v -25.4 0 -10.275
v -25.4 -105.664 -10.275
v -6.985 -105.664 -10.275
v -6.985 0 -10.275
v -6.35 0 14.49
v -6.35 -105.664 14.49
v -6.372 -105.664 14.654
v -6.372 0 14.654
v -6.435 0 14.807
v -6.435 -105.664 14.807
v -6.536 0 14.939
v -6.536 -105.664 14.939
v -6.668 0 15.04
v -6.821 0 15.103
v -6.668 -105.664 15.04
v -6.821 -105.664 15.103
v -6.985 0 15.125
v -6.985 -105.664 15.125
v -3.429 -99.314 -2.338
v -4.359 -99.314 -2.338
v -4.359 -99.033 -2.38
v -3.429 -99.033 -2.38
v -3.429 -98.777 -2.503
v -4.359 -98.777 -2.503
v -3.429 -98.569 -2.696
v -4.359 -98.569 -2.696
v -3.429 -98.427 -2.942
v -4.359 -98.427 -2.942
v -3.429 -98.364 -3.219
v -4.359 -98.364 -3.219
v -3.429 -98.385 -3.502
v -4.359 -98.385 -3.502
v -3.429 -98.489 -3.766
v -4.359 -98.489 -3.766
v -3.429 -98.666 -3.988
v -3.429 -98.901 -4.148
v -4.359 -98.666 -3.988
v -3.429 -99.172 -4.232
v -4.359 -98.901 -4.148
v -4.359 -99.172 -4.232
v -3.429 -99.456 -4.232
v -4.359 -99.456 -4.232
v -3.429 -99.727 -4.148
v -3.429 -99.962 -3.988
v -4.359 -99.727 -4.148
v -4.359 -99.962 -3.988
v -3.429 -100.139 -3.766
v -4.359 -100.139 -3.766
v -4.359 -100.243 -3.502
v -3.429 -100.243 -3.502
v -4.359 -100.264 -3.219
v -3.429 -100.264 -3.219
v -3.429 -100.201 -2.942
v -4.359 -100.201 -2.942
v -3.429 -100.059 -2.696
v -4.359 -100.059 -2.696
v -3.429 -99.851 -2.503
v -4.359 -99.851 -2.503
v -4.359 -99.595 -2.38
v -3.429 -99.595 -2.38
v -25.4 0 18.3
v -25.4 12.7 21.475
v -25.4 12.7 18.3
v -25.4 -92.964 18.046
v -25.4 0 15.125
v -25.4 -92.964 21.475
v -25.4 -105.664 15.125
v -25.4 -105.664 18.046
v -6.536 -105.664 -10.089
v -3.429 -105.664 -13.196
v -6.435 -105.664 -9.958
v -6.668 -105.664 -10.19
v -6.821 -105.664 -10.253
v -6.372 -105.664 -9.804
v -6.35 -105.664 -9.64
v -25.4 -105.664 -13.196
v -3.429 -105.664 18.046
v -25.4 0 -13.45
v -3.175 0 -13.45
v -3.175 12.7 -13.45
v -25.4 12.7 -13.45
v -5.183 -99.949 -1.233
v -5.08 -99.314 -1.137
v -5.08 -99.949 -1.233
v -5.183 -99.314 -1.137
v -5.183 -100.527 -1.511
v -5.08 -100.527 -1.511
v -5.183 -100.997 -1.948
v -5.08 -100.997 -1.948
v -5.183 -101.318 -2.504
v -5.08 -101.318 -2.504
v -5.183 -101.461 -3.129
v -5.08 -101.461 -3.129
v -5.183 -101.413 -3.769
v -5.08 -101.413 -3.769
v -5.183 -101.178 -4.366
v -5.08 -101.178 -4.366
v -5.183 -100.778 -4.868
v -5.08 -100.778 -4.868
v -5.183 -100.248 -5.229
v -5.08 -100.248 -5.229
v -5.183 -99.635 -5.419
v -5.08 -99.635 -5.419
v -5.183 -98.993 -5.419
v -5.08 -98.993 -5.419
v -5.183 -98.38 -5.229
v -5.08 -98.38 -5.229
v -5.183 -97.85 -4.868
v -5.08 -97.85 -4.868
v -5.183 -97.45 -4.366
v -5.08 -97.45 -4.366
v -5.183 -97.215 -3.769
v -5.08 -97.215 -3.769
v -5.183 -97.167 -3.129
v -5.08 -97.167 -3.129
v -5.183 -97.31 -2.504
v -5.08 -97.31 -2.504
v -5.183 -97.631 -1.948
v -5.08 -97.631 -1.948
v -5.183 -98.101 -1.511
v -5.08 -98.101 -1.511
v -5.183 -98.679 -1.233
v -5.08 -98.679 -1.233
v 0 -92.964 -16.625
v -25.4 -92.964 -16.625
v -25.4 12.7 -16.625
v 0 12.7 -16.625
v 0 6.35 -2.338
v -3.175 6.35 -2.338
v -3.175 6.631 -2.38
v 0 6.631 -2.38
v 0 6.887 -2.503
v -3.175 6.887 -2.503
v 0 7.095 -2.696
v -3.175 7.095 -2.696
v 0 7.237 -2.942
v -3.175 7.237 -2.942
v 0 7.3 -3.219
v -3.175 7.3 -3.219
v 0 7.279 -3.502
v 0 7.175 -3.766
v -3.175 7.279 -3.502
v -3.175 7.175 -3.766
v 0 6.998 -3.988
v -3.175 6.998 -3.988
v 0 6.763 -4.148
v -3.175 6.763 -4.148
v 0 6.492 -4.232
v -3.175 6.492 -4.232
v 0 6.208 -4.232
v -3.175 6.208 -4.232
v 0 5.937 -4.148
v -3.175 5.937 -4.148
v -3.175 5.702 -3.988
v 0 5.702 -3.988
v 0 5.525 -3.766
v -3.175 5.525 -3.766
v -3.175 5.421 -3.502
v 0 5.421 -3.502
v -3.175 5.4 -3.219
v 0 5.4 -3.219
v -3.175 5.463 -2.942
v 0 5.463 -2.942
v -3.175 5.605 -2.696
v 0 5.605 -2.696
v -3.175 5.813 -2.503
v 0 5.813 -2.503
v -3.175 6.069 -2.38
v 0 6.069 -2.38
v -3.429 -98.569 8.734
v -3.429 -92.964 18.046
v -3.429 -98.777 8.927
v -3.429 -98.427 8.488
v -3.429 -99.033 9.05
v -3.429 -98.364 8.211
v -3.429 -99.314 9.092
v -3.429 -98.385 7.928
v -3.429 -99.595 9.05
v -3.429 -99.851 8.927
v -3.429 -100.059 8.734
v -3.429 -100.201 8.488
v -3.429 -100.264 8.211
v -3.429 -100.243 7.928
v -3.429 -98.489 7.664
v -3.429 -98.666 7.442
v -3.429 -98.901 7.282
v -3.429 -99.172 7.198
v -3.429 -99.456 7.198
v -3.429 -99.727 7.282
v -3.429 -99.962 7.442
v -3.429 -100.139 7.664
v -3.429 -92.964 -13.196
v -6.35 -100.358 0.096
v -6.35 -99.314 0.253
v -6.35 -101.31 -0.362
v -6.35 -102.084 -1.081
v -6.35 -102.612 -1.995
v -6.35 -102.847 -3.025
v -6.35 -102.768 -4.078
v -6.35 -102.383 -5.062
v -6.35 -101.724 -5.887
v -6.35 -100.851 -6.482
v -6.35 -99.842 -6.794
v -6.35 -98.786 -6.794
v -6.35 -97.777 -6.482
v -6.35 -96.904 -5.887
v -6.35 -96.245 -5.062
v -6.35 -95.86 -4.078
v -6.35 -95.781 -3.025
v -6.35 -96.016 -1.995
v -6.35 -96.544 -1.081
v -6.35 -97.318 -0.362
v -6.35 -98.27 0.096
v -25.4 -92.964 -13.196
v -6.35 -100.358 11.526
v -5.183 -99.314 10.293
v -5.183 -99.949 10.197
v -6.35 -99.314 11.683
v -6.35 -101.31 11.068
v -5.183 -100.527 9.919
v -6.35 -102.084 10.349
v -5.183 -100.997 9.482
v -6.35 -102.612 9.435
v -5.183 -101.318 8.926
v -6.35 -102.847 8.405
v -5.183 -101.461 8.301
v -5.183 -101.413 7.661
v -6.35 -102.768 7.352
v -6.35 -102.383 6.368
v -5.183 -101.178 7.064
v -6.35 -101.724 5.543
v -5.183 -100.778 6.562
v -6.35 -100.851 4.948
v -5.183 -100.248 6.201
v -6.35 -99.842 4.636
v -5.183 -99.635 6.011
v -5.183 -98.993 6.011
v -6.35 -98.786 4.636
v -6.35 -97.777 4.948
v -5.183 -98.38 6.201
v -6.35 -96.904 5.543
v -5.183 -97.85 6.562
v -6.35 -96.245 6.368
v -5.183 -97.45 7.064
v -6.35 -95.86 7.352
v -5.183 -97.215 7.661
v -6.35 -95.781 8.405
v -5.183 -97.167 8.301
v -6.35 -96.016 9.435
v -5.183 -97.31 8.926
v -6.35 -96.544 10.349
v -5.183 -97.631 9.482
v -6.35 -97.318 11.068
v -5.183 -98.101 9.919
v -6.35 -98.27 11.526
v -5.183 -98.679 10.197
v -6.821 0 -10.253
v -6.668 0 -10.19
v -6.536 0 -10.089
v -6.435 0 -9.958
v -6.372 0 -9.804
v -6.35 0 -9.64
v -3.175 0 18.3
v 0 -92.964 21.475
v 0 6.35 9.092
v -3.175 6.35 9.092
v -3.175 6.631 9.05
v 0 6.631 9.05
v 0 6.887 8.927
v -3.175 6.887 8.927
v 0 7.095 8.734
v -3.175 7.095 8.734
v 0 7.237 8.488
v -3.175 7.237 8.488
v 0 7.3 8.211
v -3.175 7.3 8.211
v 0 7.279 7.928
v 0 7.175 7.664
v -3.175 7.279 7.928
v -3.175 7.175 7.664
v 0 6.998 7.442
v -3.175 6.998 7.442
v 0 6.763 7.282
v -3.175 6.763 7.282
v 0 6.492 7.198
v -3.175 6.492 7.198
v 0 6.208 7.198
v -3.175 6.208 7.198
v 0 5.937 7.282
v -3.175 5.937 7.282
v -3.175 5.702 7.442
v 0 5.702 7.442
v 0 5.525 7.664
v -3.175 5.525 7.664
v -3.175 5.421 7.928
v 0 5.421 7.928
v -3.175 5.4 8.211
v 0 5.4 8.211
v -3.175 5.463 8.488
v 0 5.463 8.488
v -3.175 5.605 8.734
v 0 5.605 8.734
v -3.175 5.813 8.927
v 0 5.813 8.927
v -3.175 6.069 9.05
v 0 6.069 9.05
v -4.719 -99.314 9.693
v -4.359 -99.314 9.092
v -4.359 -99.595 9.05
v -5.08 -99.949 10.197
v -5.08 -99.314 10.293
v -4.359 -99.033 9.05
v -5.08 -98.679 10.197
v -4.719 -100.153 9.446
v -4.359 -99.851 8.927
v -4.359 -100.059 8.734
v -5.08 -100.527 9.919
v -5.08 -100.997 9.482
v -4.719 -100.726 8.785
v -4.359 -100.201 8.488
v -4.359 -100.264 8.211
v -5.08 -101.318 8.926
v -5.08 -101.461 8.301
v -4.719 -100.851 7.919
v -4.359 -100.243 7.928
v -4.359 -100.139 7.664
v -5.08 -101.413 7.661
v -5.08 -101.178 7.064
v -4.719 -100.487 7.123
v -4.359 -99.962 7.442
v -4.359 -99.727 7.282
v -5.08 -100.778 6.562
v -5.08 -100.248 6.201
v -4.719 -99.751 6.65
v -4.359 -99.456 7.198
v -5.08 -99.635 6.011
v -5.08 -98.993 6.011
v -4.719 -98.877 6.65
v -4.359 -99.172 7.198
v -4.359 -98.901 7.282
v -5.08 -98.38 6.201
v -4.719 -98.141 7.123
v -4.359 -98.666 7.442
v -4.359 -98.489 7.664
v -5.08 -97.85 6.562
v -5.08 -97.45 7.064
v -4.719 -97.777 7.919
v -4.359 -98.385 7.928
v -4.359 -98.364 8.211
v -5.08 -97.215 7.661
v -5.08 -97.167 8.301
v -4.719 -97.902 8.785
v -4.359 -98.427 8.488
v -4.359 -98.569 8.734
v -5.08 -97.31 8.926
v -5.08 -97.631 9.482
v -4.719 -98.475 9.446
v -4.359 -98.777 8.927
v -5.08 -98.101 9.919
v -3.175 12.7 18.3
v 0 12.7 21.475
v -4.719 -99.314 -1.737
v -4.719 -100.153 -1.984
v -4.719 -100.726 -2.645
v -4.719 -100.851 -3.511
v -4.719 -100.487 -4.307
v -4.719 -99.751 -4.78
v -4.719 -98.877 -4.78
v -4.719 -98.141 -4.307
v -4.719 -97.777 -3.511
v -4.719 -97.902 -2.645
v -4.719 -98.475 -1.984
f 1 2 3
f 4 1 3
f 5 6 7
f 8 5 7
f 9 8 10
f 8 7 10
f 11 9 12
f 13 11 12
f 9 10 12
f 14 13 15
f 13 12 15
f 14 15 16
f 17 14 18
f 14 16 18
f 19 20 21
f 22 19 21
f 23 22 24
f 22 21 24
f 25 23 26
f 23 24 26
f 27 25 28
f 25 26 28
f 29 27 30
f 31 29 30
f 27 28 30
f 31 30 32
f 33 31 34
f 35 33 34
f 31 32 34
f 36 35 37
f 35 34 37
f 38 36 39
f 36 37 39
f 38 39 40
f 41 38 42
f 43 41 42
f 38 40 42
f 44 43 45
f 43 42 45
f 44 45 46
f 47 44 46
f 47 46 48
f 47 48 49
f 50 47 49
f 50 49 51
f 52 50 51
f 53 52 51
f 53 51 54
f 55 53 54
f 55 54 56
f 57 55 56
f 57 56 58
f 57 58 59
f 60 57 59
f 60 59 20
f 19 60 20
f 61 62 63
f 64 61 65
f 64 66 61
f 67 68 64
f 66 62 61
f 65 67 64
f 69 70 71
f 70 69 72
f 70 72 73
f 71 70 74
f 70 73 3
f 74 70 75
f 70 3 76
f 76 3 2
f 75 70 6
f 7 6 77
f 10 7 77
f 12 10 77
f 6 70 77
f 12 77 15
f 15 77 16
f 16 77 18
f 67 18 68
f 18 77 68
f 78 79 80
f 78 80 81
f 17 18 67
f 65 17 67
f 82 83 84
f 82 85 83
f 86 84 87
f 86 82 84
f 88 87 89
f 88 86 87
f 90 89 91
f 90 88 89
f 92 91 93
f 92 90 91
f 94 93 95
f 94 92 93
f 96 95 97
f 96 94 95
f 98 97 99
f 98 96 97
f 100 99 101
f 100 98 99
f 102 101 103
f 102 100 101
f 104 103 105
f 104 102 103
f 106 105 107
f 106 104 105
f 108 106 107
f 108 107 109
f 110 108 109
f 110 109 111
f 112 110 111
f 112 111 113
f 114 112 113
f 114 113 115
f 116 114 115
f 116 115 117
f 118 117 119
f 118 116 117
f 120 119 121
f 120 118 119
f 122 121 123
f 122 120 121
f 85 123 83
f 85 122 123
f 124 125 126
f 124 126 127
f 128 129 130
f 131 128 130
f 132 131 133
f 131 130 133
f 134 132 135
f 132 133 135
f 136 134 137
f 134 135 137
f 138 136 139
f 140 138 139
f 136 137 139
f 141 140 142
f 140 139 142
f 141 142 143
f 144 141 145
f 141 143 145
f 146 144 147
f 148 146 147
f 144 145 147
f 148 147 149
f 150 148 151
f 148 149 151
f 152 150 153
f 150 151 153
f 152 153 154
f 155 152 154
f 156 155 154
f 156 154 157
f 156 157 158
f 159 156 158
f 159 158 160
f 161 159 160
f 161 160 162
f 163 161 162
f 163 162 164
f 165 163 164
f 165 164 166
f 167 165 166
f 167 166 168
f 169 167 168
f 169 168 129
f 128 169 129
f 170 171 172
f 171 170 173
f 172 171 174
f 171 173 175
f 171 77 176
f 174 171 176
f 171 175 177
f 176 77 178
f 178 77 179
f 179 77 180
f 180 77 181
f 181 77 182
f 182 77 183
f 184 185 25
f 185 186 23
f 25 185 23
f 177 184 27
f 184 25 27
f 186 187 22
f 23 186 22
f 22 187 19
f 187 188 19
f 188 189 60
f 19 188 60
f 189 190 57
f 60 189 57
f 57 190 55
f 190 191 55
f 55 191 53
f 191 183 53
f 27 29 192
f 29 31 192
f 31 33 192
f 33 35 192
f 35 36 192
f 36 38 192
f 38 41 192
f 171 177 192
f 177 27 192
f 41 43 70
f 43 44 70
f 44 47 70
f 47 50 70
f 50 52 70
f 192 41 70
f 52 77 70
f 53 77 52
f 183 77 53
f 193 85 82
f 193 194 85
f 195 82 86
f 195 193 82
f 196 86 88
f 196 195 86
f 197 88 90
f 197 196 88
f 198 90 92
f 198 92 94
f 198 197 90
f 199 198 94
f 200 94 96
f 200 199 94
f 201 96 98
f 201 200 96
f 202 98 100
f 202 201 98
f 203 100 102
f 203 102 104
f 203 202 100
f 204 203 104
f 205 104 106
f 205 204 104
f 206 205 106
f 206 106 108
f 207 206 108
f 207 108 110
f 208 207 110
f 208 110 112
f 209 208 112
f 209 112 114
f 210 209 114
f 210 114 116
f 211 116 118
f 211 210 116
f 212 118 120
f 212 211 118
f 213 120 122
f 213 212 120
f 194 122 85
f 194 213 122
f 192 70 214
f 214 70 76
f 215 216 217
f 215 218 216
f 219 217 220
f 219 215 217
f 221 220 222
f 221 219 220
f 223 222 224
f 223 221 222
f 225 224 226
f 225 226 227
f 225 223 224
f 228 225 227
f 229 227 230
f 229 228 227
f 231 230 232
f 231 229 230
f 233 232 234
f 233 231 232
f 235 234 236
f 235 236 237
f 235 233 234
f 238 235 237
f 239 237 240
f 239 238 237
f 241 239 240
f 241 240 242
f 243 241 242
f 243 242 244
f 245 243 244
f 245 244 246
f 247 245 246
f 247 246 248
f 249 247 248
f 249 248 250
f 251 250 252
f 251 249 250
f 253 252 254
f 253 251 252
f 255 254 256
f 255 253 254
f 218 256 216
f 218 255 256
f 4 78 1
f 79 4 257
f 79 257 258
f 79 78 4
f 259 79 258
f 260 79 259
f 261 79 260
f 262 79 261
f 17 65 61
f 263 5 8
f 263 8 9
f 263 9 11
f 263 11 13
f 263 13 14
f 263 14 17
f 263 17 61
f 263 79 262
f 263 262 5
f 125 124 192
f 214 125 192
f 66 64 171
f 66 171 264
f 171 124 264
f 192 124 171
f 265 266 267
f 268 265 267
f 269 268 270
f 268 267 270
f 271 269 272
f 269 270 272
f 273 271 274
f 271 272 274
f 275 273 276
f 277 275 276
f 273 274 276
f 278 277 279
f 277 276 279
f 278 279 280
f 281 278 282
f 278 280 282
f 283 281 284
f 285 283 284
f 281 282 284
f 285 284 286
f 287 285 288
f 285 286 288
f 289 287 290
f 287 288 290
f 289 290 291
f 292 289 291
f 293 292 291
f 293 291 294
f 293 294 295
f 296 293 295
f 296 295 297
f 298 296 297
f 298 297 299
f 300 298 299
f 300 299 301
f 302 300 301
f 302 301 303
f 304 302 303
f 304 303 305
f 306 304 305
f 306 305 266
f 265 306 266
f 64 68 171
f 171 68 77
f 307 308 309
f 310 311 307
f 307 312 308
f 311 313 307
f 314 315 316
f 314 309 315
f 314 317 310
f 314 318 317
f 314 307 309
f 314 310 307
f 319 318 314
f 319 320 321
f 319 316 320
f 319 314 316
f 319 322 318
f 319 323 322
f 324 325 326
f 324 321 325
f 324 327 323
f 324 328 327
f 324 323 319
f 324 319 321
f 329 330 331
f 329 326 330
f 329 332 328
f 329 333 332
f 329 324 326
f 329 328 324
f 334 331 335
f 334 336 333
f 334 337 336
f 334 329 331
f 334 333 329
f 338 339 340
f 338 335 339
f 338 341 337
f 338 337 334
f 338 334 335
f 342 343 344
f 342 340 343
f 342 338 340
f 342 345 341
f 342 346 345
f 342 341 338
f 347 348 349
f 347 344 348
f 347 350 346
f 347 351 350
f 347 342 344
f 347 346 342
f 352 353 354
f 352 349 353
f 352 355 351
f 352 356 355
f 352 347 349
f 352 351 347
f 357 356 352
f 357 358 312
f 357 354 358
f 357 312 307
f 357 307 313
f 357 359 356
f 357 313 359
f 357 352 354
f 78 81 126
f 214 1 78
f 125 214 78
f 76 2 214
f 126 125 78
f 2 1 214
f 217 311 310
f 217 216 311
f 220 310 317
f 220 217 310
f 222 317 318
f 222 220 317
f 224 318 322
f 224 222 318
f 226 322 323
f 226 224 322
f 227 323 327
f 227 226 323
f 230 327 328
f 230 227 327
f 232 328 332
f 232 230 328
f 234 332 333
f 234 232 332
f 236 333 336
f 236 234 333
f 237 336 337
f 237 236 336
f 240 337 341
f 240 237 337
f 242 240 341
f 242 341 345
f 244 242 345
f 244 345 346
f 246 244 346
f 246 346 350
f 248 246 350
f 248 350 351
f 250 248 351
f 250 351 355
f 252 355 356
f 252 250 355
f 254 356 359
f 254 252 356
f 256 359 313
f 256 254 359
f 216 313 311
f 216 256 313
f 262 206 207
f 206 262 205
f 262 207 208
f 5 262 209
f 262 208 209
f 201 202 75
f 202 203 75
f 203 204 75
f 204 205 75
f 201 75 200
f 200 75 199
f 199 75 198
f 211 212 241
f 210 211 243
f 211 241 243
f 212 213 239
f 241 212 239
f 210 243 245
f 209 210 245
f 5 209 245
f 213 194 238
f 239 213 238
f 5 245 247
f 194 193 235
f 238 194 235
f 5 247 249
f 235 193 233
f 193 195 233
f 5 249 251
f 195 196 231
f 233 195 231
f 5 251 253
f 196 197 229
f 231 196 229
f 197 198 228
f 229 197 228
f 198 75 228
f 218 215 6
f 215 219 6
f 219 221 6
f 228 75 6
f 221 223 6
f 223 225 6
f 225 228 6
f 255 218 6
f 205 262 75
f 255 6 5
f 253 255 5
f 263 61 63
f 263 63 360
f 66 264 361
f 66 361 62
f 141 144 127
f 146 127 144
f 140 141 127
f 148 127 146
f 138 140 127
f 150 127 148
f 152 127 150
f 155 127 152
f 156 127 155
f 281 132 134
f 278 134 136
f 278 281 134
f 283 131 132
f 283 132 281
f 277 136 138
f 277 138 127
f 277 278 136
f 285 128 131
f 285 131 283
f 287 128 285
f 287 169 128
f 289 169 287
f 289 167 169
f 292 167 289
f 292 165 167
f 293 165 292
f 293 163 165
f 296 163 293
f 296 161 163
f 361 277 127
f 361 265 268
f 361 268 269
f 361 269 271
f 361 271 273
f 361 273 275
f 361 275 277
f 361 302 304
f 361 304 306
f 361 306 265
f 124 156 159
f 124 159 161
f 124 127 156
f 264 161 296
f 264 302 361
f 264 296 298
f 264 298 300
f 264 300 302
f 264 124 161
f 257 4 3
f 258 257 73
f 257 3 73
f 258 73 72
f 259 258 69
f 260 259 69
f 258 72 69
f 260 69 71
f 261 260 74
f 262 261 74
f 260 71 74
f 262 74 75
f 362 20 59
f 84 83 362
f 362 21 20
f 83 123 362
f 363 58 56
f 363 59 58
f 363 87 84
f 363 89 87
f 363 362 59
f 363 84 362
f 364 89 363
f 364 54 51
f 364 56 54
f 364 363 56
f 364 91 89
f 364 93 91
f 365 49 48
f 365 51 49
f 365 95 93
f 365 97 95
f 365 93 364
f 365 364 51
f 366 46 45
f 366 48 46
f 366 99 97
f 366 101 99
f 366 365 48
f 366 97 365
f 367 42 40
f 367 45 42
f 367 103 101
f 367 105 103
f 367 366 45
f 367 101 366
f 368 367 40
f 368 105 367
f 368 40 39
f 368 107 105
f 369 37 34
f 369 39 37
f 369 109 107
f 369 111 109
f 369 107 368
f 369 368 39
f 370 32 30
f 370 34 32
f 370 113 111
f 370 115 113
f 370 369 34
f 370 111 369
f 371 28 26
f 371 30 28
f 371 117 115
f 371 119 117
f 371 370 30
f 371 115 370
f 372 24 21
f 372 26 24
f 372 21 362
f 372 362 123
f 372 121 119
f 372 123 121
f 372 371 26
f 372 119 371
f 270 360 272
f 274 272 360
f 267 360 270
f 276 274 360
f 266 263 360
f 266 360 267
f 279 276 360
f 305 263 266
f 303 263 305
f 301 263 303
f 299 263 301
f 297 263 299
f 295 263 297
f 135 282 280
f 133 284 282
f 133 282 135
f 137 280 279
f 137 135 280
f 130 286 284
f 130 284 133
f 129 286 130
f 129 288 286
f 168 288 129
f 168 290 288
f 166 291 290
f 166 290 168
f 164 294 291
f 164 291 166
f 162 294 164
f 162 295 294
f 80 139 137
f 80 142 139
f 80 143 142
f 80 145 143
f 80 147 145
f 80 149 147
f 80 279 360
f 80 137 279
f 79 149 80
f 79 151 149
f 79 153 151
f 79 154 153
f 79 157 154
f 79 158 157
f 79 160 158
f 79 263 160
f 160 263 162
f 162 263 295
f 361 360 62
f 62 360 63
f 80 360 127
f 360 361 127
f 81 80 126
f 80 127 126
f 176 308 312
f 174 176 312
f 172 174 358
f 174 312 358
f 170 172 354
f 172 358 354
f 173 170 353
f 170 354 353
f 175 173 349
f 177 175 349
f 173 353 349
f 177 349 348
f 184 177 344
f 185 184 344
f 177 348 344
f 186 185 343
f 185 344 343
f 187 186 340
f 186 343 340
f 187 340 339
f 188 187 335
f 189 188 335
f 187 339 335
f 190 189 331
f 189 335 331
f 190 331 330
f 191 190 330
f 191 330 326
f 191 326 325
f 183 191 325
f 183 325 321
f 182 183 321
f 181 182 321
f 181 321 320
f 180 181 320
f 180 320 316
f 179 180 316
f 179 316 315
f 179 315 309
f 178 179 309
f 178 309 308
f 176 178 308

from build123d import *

# Parameters (mm, degrees)
BOSS_EXTRUDE1_START                       = 12.7
BOSS_EXTRUDE1_DEPTH                       = 12.7
BOSS_EXTRUDE2_DEPTH                       = 12.7
SKETCH7_R                                 = 0.9525
CUT_EXTRUDE1_DEPTH                        = 111.090903984
SKETCH10_R                                = 0.9525
CUT_EXTRUDE2_DEPTH                        = 110.494104933
CSK_FOR_6_FLAT_HEAD_MACHINE_SCREW_2_COUNT = 2
CSK_FOR_6_FLAT_HEAD_MACHINE_SCREW_2_PITCH = 11.43


with BuildPart() as part:
    # Sweep1: sweep along a path in Sketch4
    with BuildLine(Plane.XY) as sweep1_path:
        Line((0, 0), (0, -92.964))
    # Sketch3 → Sweep1 (sweep)
    with BuildSketch(Plane(origin=(0, 0, 0), x_dir=(1, 0, 0), z_dir=(0, 1, 0))):
        with BuildLine():
            Line((0, 16.62500014), (-25.4, 16.62500014))
            Line((-25.4, 16.62500014), (-25.4, 10.27500014))
            Line((-25.4, 10.27500014), (-6.985, 10.27500014))
            ThreePointArc((-6.985, 10.27500014), (-6.535987194, 10.089012946), (-6.35, 9.64000014))
            Line((-6.35, 9.64000014), (-6.35, -14.48999986))
            ThreePointArc((-6.35, -14.48999986), (-6.535987194, -14.939012666), (-6.985, -15.12499986))
            Line((-6.985, -15.12499986), (-25.4, -15.12499986))
            Line((-25.4, -15.12499986), (-25.4, -21.47499986))
            Line((-25.4, -21.47499986), (0, -21.47499986))
            Line((0, -21.47499986), (0, 16.62500014))
        make_face()
    sweep(path=sweep1_path.line)

    # Sketch5 → Boss-Extrude1 (add)
    with BuildSketch(Plane.XZ.offset(92.964).offset(BOSS_EXTRUDE1_START)):
        with BuildLine():
            Line((-25.4, 18.04599986), (-3.429, 18.04599986))
            Line((-3.429, 18.04599986), (-3.429, -13.19600014))
            Line((-3.429, -13.19600014), (-25.4, -13.19600014))
            Line((-25.4, -13.19600014), (-25.4, -10.27500014))
            Line((-25.4, -10.27500014), (-6.985, -10.27500014))
            ThreePointArc((-6.985, -10.27500014), (-6.535987194, -10.089012946), (-6.35, -9.64000014))
            Line((-6.35, -9.64000014), (-6.35, 14.48999986))
            ThreePointArc((-6.35, 14.48999986), (-6.535987194, 14.939012666), (-6.985, 15.12499986))
            Line((-6.985, 15.12499986), (-25.4, 15.12499986))
            Line((-25.4, 15.12499986), (-25.4, 18.04599986))
        make_face()
    extrude(amount=-BOSS_EXTRUDE1_DEPTH)

    # Sketch6 → Boss-Extrude2 (add)
    with BuildSketch(Plane(origin=(0, 0, 0), x_dir=(1, 0, 0), z_dir=(0, 1, 0))):
        Polygon((-25.4, 13.45000014), (-25.4, 16.62500014), (0, 16.62500014), (0, -21.47499986), (-25.4, -21.47499986), (-25.4, -18.29999986), (-3.175, -18.29999986), (-3.175, 13.45000014), align=None)
    extrude(amount=BOSS_EXTRUDE2_DEPTH)

    # Sketch7 → Cut-Extrude1 (cut, through all)
    with BuildSketch(Plane.ZY.offset(3.175)):
        with Locations((-3.29000014, 6.35)):
            Circle(SKETCH7_R)
        with Locations((8.13999986, 6.35)):
            Circle(SKETCH7_R)
    extrude(amount=-CUT_EXTRUDE1_DEPTH, mode=Mode.SUBTRACT)

    # Sketch10 → Cut-Extrude2 (cut, through all)
    with BuildSketch(Plane.ZY.offset(6.35)):
        with Locations((-3.29000014, -99.314)):
            Circle(SKETCH10_R)
        with Locations((8.13999986, -99.314)):
            Circle(SKETCH10_R)
    extrude(amount=-CUT_EXTRUDE2_DEPTH, mode=Mode.SUBTRACT)

    # Sketch13 → CSK for #6 Flat Head Machine Screw (100)2 (revolve, cut)
    with BuildSketch(Plane(origin=(-6.35, -99.314, -3.29000014), x_dir=(0, 0, 1), z_dir=(0, 1, 0))):
        Polygon((0, 0), (0, 2.563442612), (2.15265, 1.27), (2.15265, 1.166893902), (3.5433, 0), align=None)
    csk_for_6_flat_head_machine_screw_100 = revolve(axis=Axis((-12.7, -99.314, -3.29000014), (1, 0, 0)), mode=Mode.SUBTRACT)

    # CSK for _6 Flat Head Machine Screw _ 2: CSK for #6 Flat Head Machine Screw (100)2 ×2
    with Locations(*[(0, 0, i * CSK_FOR_6_FLAT_HEAD_MACHINE_SCREW_2_PITCH) for i in range(1, CSK_FOR_6_FLAT_HEAD_MACHINE_SCREW_2_COUNT)]):
        add(csk_for_6_flat_head_machine_screw_100, mode=Mode.SUBTRACT)


solid = part.part
